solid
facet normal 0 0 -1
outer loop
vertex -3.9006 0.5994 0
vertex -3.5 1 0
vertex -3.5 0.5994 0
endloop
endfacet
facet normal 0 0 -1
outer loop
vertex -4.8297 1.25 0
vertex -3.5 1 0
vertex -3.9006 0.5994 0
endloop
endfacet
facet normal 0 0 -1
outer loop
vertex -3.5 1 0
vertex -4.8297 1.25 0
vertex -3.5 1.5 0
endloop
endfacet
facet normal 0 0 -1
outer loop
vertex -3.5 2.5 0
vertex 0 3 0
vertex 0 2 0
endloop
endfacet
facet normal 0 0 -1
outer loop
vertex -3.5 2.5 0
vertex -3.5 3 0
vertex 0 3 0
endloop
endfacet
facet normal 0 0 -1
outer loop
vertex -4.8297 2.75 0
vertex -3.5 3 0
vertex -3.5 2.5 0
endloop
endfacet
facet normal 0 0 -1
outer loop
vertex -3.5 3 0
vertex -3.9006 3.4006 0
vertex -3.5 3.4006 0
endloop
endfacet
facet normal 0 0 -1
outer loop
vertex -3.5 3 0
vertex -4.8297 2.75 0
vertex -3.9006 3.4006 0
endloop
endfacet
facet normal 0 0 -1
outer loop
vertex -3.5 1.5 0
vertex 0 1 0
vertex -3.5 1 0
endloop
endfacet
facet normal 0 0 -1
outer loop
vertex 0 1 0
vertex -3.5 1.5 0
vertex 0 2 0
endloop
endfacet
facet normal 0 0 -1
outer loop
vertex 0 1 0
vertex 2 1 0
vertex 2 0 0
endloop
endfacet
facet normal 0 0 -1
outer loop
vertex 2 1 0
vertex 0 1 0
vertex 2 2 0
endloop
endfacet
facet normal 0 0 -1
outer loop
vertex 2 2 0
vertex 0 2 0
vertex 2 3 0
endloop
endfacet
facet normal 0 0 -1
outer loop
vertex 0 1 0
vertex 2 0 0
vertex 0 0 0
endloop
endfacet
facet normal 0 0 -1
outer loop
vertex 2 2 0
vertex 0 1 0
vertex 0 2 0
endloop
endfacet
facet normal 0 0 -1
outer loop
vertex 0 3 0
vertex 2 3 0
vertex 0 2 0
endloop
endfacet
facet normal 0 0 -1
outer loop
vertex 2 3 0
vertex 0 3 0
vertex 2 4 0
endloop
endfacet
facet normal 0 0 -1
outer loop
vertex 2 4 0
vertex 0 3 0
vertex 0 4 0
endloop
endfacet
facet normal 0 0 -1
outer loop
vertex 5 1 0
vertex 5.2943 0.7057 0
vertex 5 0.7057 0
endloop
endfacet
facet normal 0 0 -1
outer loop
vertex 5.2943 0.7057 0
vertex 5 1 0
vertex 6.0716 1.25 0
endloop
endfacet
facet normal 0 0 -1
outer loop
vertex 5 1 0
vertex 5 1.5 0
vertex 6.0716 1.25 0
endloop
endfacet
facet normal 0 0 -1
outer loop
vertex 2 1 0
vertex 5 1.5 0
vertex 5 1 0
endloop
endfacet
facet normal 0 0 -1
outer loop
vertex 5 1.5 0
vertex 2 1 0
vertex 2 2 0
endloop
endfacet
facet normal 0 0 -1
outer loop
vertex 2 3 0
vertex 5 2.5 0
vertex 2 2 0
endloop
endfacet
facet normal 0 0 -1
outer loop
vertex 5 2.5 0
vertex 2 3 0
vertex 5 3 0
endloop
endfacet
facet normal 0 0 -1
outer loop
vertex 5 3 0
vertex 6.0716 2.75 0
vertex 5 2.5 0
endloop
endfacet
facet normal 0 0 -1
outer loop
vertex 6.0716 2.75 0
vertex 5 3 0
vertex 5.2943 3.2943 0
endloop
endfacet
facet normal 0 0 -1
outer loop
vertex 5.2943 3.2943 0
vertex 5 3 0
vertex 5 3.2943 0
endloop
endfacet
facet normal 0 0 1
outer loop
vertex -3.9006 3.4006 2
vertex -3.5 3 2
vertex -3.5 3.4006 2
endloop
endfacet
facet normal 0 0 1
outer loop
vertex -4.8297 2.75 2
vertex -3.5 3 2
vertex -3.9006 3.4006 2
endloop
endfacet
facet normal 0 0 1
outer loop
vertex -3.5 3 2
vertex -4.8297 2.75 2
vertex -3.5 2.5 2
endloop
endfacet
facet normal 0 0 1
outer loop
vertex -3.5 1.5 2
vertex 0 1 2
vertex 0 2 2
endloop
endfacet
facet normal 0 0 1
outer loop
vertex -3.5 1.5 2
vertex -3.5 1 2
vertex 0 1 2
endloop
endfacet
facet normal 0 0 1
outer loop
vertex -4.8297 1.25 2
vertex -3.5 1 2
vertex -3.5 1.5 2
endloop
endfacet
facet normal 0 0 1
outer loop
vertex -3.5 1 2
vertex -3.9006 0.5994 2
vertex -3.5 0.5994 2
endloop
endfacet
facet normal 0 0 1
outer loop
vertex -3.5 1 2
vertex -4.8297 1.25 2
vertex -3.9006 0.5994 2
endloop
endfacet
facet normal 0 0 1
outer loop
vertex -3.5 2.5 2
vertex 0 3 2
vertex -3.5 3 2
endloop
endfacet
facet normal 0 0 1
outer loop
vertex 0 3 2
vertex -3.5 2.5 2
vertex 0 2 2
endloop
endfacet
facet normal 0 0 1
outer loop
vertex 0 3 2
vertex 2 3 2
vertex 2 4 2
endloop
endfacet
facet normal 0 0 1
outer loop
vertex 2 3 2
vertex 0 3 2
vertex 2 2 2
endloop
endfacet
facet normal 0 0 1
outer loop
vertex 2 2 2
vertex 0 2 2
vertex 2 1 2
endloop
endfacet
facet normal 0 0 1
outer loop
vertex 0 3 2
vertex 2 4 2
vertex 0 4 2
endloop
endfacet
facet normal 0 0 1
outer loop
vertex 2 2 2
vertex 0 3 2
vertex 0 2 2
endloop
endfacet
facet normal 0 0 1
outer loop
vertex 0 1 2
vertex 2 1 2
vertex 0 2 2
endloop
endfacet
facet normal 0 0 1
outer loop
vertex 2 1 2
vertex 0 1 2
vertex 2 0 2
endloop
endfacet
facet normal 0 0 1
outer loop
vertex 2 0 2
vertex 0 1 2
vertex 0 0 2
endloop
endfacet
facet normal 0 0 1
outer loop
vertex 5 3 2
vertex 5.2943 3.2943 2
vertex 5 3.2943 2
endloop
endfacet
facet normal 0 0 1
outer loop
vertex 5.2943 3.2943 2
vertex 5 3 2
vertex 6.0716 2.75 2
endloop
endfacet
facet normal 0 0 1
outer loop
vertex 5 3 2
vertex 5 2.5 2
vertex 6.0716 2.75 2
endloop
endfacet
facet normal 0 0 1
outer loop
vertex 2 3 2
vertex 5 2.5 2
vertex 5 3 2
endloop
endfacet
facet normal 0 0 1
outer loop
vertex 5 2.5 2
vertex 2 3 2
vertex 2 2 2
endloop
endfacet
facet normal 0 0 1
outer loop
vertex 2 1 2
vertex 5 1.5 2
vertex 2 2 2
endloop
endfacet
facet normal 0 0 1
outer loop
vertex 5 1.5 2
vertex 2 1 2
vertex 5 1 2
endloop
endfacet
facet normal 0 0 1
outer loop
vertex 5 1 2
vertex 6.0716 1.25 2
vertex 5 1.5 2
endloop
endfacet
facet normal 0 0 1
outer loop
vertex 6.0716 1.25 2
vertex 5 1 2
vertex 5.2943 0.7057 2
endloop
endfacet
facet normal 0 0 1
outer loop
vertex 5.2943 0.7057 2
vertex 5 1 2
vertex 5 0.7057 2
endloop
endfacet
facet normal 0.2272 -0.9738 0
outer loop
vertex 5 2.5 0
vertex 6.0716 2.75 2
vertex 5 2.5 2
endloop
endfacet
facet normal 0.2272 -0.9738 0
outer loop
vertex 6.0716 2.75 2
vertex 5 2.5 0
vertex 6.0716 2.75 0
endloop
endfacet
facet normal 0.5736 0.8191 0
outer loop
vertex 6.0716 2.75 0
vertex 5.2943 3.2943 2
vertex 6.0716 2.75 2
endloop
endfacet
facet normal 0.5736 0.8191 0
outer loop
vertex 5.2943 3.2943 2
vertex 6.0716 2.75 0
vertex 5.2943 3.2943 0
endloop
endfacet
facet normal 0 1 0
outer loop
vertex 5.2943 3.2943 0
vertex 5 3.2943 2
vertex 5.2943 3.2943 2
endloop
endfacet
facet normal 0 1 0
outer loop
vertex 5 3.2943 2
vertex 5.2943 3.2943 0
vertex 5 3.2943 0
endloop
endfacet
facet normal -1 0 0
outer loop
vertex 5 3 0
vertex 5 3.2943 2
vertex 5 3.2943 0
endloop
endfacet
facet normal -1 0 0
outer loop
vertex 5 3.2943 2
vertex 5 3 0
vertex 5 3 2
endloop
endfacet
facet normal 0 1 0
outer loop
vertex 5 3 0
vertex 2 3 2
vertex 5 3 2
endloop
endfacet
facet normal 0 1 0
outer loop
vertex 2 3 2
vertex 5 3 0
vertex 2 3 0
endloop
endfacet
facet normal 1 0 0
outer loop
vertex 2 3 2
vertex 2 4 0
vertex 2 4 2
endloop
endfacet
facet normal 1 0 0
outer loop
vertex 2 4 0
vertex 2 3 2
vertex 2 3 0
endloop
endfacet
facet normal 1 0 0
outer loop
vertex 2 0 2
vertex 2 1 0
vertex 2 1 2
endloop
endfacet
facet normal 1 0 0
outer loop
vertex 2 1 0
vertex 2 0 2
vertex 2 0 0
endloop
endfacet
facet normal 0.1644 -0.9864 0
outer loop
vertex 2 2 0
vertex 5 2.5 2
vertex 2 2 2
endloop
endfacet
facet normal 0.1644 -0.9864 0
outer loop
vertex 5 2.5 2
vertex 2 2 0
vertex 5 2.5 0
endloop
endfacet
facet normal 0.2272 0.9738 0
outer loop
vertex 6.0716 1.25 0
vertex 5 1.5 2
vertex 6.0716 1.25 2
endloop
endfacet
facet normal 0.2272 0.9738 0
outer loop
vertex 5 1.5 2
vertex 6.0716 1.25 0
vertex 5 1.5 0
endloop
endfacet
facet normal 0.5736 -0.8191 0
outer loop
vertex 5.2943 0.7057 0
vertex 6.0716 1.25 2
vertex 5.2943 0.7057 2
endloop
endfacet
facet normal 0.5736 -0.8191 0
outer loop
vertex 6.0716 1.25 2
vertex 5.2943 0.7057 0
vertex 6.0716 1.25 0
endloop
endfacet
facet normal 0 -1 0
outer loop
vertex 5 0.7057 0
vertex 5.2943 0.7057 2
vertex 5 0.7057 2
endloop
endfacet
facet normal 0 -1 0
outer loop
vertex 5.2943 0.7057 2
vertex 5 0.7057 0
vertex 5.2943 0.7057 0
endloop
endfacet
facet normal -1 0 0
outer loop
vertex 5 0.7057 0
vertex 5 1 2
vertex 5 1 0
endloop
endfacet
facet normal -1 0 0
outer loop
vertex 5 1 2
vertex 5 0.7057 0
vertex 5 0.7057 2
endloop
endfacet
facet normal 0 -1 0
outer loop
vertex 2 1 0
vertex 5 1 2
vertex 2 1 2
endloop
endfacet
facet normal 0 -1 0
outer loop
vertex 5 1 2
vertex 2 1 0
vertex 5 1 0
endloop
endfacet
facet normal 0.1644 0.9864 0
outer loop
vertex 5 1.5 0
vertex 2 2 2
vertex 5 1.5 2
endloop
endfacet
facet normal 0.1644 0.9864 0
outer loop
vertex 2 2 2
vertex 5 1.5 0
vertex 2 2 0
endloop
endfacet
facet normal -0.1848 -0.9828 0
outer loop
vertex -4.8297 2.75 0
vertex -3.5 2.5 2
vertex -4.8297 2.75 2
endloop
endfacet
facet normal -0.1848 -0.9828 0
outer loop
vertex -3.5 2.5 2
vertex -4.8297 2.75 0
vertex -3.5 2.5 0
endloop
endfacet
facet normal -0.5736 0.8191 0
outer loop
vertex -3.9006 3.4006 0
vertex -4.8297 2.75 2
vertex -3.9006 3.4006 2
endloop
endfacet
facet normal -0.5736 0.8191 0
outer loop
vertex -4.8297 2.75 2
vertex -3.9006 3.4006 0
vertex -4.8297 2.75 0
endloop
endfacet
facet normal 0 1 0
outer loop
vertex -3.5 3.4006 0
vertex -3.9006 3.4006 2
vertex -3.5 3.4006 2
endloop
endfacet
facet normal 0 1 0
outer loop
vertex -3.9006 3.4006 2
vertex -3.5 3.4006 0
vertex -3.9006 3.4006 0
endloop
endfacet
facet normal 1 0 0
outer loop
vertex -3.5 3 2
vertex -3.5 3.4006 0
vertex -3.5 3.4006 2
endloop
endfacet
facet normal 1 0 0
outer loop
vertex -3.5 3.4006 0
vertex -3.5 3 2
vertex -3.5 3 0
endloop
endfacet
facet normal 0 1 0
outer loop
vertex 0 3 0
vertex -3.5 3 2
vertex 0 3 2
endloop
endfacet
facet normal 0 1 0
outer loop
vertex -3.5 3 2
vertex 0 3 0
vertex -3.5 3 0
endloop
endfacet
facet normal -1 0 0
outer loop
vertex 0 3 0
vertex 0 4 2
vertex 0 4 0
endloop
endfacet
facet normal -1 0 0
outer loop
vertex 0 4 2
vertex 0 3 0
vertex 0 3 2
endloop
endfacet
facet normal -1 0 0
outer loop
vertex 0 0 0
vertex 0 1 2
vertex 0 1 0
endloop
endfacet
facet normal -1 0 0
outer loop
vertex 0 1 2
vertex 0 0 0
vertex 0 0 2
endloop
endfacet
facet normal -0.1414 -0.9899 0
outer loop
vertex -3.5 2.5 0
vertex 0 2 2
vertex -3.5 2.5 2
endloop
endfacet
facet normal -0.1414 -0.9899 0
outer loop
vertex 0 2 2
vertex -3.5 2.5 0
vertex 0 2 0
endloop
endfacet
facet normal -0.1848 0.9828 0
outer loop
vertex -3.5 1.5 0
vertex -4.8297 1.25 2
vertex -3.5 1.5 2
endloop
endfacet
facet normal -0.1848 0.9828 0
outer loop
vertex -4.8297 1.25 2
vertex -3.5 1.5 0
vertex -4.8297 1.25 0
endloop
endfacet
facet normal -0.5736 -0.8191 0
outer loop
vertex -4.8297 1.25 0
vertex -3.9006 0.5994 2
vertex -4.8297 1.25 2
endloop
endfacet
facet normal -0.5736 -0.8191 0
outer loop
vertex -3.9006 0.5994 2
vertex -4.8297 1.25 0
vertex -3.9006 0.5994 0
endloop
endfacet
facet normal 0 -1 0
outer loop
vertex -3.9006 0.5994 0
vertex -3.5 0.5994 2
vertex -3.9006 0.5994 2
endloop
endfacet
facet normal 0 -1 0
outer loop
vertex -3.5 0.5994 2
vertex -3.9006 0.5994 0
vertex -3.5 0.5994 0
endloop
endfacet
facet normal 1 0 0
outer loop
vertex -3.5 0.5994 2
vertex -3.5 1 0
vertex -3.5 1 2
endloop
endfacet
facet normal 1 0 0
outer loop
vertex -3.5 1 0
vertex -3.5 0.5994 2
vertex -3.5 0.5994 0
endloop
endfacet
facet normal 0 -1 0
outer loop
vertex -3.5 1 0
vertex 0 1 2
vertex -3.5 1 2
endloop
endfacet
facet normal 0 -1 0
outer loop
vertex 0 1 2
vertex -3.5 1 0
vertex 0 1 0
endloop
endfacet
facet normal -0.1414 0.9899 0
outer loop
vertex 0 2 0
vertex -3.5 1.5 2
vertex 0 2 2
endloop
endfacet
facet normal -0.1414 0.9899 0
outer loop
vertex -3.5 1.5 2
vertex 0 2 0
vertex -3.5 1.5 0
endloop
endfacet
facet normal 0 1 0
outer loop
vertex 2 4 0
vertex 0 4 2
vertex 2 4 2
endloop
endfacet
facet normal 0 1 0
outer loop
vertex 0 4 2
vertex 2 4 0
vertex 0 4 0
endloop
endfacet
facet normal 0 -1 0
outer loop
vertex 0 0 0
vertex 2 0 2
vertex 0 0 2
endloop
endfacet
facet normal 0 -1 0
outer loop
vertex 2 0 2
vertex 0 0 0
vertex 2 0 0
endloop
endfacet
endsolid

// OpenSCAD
// file: libraries/SnapLib/SnapLib.0.36.scad
/*simple Snap library based on "Snap-Fit Joints for Plastics - A Design Guid" by Bayer MaterialScience LLC 
  http://fab.cba.mit.edu/classes/S62.12/people/vernelle.noel/Plastic_Snap_fit_design.pdf
 
 on http://www.thingiverse.com/thing:1860118
 
    by fpetrac Fausto Petraccone fpetrac@gmail.com 
    Licensed under the Creative Commons - Attribution - Non-Commercial license.
*/

/*Rev
    SnapLib 0.36.scad: added SnapHoleY function  
    SnapLib 0.35.scad: on RSnapY added a check to avioid interference of lobes during closure; on RRSnappY added a check to avioid overlapped lobes.
    SnapLib 0.30.scad  added function Hsnap and Snap to calculate the snap H or Y for cantilever snap
    SnapLib 0.25.scad  added Scale factor f to reduce the calculate value h or y (this mantain the snap on unbreakable zone when f>1)
    SnapLib 0.20.scad  Bug Fix
    SnapLib 0.10.scad  added RSnapY RRSnapY
    SnapLib 0.00.scad  first release
*/


/*
eps=0.5*6/100;//Elongation at break of PLA=6%
eps=0.5*12/100;//Elongation at break of ABS=12%
eps=0.5*18/100;//Elongation at break of PETG=18%
*/

eps=0.5*6/100;//Elongation at break of PLA=6%


function Hsnap(l,y,f)= (1.09/f)*(eps*pow(l,2))/(y);
function Ysnap(l,h,f)= (1.09/f)*(eps*pow(l,2))/(h);

//SnapH(l,y,a,b,f=1) Define y calculate h and divide the calculte h value to a factor f
module SnapH(l,y,a,b,f=1)   
{
    h=Hsnap(l,y,f);
    p=y;
    echo("h is",h);
linear_extrude(height = b, center = f, convexity = 10, twist = 0)
polygon([[0,0],[l,0],[l,y],[l+p,y],[l+p+(y+h/4)/tan(a),-h/4],[l,-h/2],[0,-h]]);
}
//SnapY(l,h,a,b,f=1) Define h calculate y and divide the calculte y value to a factor f
module SnapY(l,h,a,b,f=1)
{
    y=Ysnap(l,h,f);
    p=y;
    echo("y is", y);
linear_extrude(height = b, center = f, convexity = 10, twist = 0)
polygon([[0,0],[l,0],[l,y],[l+p,y],[l+p+(y+h/4)/tan(a),-h/4],[l,-h/2],[0,-h]]);
}
//SnapHoleY(l,h,a,b,f=1,Pr=2) Define h calculate y and divide the calculte y value to a factor f the total hole depth is h*PR
module SnapHoleY(l,h,a,b,f=1,Pr=2){
        //%SnapY(l,h,a,b);  
        y=Ysnap(l,h,f);
        YY=Pr*h;//depth Y;
        XX=1.1*(y+(y+h/4)/tan(a)); //Altezza totale +10%
        ZZ=0+b; //largezza piu tolleranza
        union(){
            translate([0,-YY,(b-ZZ)/2])cube([l,YY,ZZ],center=false); //gambo
            translate([l,-YY,(b-ZZ)/2])cube([XX,YY+y,ZZ],center=false);//testa
        }    
 }



//Define h calculate y and divide the calculated value to f
module RSnapY(l,h,a,Lobi,r2,f=1,K2=2)   
{
    Theta=180/Lobi;
    y=(1.64/f)*K2*(eps*pow(l,2))/(r2);
    p=y;
    echo("y is", y);
    echo("r1/r2",(r2-h)/r2);
    echo("Theta", Theta);
    echo("r2-h",(r2-h));
    if(((r2-h)>y)&&(h<r2)){ //(r2-h)>y should be (r2-h/2)>y and  h<r2 for scad problem
      for(f=[0:1:Lobi])
          rotate([0,0,Theta*2*f])
              rotate_extrude(angle = Theta, convexity = 2,$fn=200)
                  translate([r2,0,0])
                      mirror([1,-1,0])
                          polygon([[0,0],[l,0],[l,y],[l+p,y],[l+p+(y+h/4)/tan(a),-h/4],[l,-h/2],[0,-h]]);
    }
    else{
      echo ("<b>WARNING:</b>");
      echo("y should be < r2-h ");
      echo("h should be < r2 ");
    }
}
//Define h calculate y and divide the calculated value to f
module RRSnapY(l,h,a,Lobi,r2,f=1,K1=2)
{
    Theta=180/Lobi;
    y=(1.64/f)*K1*(eps*pow(l,2))/(r2);
    p=y;
    echo("y is", y);
    echo("r1/r2",(r2-h)/r2);
    echo("Theta", Theta);
    echo("r2-y",(r2-y));
    if(y<r2){
      for(f=[0:1:Lobi])
          rotate([0,180,Theta*2*f])
              rotate_extrude(angle = Theta, convexity = 2,$fn=200)
                  translate([r2,0,0])
                      mirror([1,1,0])
                          polygon([[0,0],[l,0],[l,y],[l+p,y],[l+p+(y+h/4)/tan(a),-h/4],[l,-h/2],[0,-h]]);
  }
      else{
      echo ("<b>WARNING:</b>");
      echo("y should be < r2 ");
      }
}
// file: utils.scad
// Utilities
use <libraries/SnapLib/SnapLib.0.36.scad>

// Snap Joints

/**
 * cantileverSnap: creates the snap portion of a Cantilever Joint
 * x_size: size on x-axis of containing box
 * y_size: size on y-axis of containing box
 * z_size: size on z-axis of containing box
 */
module cantileverSnap(size) {
    x_size = size[0];
    y_size = size[1];
    z_size = size[2];
    single_cantilever_base = y_size / 4;
    single_cantilever_leg_size = x_size / 2;
    translate([0, 3 *single_cantilever_base, 0])
    SnapY(l=single_cantilever_leg_size,h=single_cantilever_base,a=35,b=z_size);
    translate([0, 4 * single_cantilever_base, 0])
    mirror([0,1,0])
    translate([0, 3 *single_cantilever_base, 0])
    SnapY(l=single_cantilever_leg_size,h=single_cantilever_base,a=35,b=z_size);
}

/**
 * cantileverHole: creates the hole portion of a Cantilever Joint
 * x_size: size on x-axis of containing box
 * y_size: size on y-axis of containing box
 * z_size: size on z-axis of containing box
 */
module cantileverHole(size, tolerance =0.05) {
    x_size = size[0];
    y_size = size[1];
    z_size = size[2];
    ratio = 1 - tolerance;
    single_cantilever_base = y_size / 4;
    single_cantilever_leg_size = x_size / 2;
    overhang = Ysnap(l=single_cantilever_leg_size, h=single_cantilever_base, f=1);
    cube([single_cantilever_leg_size * ratio, single_cantilever_base * ratio, z_size]);
    translate([0, 4 * single_cantilever_base, 0])
    mirror([0,1,0])
    cube([single_cantilever_leg_size * ratio, single_cantilever_base * ratio, z_size]);
    snap_stop = single_cantilever_leg_size+ overhang + (overhang + single_cantilever_base/4)/tan(35);
    back_size = x_size - snap_stop - overhang;
    translate([snap_stop + overhang,0,0])
    cube([back_size,y_size,z_size]);
}

// GOOD EXAMPLE
// color("red")
// cantileverSnap(7,4,2);
// color("green")
// cantileverHole(7,4,2);

box = [6,4,2];
color("red")
cantileverSnap(box);
color("green")
cantileverHole(box);
// main file
use <utils.scad>

box1 = [6,4,2];
box2 = [7,4,2];

// SNAPS back to back

translate([2,0,0]) cantileverSnap(box1);
cube([2,4,2]);
mirror([1,0,0]) cantileverSnap(box2);

// Holes
/*
box = box1;
translate([0,0,box[2]]) cantileverHole(box);
cube(box);
*/
